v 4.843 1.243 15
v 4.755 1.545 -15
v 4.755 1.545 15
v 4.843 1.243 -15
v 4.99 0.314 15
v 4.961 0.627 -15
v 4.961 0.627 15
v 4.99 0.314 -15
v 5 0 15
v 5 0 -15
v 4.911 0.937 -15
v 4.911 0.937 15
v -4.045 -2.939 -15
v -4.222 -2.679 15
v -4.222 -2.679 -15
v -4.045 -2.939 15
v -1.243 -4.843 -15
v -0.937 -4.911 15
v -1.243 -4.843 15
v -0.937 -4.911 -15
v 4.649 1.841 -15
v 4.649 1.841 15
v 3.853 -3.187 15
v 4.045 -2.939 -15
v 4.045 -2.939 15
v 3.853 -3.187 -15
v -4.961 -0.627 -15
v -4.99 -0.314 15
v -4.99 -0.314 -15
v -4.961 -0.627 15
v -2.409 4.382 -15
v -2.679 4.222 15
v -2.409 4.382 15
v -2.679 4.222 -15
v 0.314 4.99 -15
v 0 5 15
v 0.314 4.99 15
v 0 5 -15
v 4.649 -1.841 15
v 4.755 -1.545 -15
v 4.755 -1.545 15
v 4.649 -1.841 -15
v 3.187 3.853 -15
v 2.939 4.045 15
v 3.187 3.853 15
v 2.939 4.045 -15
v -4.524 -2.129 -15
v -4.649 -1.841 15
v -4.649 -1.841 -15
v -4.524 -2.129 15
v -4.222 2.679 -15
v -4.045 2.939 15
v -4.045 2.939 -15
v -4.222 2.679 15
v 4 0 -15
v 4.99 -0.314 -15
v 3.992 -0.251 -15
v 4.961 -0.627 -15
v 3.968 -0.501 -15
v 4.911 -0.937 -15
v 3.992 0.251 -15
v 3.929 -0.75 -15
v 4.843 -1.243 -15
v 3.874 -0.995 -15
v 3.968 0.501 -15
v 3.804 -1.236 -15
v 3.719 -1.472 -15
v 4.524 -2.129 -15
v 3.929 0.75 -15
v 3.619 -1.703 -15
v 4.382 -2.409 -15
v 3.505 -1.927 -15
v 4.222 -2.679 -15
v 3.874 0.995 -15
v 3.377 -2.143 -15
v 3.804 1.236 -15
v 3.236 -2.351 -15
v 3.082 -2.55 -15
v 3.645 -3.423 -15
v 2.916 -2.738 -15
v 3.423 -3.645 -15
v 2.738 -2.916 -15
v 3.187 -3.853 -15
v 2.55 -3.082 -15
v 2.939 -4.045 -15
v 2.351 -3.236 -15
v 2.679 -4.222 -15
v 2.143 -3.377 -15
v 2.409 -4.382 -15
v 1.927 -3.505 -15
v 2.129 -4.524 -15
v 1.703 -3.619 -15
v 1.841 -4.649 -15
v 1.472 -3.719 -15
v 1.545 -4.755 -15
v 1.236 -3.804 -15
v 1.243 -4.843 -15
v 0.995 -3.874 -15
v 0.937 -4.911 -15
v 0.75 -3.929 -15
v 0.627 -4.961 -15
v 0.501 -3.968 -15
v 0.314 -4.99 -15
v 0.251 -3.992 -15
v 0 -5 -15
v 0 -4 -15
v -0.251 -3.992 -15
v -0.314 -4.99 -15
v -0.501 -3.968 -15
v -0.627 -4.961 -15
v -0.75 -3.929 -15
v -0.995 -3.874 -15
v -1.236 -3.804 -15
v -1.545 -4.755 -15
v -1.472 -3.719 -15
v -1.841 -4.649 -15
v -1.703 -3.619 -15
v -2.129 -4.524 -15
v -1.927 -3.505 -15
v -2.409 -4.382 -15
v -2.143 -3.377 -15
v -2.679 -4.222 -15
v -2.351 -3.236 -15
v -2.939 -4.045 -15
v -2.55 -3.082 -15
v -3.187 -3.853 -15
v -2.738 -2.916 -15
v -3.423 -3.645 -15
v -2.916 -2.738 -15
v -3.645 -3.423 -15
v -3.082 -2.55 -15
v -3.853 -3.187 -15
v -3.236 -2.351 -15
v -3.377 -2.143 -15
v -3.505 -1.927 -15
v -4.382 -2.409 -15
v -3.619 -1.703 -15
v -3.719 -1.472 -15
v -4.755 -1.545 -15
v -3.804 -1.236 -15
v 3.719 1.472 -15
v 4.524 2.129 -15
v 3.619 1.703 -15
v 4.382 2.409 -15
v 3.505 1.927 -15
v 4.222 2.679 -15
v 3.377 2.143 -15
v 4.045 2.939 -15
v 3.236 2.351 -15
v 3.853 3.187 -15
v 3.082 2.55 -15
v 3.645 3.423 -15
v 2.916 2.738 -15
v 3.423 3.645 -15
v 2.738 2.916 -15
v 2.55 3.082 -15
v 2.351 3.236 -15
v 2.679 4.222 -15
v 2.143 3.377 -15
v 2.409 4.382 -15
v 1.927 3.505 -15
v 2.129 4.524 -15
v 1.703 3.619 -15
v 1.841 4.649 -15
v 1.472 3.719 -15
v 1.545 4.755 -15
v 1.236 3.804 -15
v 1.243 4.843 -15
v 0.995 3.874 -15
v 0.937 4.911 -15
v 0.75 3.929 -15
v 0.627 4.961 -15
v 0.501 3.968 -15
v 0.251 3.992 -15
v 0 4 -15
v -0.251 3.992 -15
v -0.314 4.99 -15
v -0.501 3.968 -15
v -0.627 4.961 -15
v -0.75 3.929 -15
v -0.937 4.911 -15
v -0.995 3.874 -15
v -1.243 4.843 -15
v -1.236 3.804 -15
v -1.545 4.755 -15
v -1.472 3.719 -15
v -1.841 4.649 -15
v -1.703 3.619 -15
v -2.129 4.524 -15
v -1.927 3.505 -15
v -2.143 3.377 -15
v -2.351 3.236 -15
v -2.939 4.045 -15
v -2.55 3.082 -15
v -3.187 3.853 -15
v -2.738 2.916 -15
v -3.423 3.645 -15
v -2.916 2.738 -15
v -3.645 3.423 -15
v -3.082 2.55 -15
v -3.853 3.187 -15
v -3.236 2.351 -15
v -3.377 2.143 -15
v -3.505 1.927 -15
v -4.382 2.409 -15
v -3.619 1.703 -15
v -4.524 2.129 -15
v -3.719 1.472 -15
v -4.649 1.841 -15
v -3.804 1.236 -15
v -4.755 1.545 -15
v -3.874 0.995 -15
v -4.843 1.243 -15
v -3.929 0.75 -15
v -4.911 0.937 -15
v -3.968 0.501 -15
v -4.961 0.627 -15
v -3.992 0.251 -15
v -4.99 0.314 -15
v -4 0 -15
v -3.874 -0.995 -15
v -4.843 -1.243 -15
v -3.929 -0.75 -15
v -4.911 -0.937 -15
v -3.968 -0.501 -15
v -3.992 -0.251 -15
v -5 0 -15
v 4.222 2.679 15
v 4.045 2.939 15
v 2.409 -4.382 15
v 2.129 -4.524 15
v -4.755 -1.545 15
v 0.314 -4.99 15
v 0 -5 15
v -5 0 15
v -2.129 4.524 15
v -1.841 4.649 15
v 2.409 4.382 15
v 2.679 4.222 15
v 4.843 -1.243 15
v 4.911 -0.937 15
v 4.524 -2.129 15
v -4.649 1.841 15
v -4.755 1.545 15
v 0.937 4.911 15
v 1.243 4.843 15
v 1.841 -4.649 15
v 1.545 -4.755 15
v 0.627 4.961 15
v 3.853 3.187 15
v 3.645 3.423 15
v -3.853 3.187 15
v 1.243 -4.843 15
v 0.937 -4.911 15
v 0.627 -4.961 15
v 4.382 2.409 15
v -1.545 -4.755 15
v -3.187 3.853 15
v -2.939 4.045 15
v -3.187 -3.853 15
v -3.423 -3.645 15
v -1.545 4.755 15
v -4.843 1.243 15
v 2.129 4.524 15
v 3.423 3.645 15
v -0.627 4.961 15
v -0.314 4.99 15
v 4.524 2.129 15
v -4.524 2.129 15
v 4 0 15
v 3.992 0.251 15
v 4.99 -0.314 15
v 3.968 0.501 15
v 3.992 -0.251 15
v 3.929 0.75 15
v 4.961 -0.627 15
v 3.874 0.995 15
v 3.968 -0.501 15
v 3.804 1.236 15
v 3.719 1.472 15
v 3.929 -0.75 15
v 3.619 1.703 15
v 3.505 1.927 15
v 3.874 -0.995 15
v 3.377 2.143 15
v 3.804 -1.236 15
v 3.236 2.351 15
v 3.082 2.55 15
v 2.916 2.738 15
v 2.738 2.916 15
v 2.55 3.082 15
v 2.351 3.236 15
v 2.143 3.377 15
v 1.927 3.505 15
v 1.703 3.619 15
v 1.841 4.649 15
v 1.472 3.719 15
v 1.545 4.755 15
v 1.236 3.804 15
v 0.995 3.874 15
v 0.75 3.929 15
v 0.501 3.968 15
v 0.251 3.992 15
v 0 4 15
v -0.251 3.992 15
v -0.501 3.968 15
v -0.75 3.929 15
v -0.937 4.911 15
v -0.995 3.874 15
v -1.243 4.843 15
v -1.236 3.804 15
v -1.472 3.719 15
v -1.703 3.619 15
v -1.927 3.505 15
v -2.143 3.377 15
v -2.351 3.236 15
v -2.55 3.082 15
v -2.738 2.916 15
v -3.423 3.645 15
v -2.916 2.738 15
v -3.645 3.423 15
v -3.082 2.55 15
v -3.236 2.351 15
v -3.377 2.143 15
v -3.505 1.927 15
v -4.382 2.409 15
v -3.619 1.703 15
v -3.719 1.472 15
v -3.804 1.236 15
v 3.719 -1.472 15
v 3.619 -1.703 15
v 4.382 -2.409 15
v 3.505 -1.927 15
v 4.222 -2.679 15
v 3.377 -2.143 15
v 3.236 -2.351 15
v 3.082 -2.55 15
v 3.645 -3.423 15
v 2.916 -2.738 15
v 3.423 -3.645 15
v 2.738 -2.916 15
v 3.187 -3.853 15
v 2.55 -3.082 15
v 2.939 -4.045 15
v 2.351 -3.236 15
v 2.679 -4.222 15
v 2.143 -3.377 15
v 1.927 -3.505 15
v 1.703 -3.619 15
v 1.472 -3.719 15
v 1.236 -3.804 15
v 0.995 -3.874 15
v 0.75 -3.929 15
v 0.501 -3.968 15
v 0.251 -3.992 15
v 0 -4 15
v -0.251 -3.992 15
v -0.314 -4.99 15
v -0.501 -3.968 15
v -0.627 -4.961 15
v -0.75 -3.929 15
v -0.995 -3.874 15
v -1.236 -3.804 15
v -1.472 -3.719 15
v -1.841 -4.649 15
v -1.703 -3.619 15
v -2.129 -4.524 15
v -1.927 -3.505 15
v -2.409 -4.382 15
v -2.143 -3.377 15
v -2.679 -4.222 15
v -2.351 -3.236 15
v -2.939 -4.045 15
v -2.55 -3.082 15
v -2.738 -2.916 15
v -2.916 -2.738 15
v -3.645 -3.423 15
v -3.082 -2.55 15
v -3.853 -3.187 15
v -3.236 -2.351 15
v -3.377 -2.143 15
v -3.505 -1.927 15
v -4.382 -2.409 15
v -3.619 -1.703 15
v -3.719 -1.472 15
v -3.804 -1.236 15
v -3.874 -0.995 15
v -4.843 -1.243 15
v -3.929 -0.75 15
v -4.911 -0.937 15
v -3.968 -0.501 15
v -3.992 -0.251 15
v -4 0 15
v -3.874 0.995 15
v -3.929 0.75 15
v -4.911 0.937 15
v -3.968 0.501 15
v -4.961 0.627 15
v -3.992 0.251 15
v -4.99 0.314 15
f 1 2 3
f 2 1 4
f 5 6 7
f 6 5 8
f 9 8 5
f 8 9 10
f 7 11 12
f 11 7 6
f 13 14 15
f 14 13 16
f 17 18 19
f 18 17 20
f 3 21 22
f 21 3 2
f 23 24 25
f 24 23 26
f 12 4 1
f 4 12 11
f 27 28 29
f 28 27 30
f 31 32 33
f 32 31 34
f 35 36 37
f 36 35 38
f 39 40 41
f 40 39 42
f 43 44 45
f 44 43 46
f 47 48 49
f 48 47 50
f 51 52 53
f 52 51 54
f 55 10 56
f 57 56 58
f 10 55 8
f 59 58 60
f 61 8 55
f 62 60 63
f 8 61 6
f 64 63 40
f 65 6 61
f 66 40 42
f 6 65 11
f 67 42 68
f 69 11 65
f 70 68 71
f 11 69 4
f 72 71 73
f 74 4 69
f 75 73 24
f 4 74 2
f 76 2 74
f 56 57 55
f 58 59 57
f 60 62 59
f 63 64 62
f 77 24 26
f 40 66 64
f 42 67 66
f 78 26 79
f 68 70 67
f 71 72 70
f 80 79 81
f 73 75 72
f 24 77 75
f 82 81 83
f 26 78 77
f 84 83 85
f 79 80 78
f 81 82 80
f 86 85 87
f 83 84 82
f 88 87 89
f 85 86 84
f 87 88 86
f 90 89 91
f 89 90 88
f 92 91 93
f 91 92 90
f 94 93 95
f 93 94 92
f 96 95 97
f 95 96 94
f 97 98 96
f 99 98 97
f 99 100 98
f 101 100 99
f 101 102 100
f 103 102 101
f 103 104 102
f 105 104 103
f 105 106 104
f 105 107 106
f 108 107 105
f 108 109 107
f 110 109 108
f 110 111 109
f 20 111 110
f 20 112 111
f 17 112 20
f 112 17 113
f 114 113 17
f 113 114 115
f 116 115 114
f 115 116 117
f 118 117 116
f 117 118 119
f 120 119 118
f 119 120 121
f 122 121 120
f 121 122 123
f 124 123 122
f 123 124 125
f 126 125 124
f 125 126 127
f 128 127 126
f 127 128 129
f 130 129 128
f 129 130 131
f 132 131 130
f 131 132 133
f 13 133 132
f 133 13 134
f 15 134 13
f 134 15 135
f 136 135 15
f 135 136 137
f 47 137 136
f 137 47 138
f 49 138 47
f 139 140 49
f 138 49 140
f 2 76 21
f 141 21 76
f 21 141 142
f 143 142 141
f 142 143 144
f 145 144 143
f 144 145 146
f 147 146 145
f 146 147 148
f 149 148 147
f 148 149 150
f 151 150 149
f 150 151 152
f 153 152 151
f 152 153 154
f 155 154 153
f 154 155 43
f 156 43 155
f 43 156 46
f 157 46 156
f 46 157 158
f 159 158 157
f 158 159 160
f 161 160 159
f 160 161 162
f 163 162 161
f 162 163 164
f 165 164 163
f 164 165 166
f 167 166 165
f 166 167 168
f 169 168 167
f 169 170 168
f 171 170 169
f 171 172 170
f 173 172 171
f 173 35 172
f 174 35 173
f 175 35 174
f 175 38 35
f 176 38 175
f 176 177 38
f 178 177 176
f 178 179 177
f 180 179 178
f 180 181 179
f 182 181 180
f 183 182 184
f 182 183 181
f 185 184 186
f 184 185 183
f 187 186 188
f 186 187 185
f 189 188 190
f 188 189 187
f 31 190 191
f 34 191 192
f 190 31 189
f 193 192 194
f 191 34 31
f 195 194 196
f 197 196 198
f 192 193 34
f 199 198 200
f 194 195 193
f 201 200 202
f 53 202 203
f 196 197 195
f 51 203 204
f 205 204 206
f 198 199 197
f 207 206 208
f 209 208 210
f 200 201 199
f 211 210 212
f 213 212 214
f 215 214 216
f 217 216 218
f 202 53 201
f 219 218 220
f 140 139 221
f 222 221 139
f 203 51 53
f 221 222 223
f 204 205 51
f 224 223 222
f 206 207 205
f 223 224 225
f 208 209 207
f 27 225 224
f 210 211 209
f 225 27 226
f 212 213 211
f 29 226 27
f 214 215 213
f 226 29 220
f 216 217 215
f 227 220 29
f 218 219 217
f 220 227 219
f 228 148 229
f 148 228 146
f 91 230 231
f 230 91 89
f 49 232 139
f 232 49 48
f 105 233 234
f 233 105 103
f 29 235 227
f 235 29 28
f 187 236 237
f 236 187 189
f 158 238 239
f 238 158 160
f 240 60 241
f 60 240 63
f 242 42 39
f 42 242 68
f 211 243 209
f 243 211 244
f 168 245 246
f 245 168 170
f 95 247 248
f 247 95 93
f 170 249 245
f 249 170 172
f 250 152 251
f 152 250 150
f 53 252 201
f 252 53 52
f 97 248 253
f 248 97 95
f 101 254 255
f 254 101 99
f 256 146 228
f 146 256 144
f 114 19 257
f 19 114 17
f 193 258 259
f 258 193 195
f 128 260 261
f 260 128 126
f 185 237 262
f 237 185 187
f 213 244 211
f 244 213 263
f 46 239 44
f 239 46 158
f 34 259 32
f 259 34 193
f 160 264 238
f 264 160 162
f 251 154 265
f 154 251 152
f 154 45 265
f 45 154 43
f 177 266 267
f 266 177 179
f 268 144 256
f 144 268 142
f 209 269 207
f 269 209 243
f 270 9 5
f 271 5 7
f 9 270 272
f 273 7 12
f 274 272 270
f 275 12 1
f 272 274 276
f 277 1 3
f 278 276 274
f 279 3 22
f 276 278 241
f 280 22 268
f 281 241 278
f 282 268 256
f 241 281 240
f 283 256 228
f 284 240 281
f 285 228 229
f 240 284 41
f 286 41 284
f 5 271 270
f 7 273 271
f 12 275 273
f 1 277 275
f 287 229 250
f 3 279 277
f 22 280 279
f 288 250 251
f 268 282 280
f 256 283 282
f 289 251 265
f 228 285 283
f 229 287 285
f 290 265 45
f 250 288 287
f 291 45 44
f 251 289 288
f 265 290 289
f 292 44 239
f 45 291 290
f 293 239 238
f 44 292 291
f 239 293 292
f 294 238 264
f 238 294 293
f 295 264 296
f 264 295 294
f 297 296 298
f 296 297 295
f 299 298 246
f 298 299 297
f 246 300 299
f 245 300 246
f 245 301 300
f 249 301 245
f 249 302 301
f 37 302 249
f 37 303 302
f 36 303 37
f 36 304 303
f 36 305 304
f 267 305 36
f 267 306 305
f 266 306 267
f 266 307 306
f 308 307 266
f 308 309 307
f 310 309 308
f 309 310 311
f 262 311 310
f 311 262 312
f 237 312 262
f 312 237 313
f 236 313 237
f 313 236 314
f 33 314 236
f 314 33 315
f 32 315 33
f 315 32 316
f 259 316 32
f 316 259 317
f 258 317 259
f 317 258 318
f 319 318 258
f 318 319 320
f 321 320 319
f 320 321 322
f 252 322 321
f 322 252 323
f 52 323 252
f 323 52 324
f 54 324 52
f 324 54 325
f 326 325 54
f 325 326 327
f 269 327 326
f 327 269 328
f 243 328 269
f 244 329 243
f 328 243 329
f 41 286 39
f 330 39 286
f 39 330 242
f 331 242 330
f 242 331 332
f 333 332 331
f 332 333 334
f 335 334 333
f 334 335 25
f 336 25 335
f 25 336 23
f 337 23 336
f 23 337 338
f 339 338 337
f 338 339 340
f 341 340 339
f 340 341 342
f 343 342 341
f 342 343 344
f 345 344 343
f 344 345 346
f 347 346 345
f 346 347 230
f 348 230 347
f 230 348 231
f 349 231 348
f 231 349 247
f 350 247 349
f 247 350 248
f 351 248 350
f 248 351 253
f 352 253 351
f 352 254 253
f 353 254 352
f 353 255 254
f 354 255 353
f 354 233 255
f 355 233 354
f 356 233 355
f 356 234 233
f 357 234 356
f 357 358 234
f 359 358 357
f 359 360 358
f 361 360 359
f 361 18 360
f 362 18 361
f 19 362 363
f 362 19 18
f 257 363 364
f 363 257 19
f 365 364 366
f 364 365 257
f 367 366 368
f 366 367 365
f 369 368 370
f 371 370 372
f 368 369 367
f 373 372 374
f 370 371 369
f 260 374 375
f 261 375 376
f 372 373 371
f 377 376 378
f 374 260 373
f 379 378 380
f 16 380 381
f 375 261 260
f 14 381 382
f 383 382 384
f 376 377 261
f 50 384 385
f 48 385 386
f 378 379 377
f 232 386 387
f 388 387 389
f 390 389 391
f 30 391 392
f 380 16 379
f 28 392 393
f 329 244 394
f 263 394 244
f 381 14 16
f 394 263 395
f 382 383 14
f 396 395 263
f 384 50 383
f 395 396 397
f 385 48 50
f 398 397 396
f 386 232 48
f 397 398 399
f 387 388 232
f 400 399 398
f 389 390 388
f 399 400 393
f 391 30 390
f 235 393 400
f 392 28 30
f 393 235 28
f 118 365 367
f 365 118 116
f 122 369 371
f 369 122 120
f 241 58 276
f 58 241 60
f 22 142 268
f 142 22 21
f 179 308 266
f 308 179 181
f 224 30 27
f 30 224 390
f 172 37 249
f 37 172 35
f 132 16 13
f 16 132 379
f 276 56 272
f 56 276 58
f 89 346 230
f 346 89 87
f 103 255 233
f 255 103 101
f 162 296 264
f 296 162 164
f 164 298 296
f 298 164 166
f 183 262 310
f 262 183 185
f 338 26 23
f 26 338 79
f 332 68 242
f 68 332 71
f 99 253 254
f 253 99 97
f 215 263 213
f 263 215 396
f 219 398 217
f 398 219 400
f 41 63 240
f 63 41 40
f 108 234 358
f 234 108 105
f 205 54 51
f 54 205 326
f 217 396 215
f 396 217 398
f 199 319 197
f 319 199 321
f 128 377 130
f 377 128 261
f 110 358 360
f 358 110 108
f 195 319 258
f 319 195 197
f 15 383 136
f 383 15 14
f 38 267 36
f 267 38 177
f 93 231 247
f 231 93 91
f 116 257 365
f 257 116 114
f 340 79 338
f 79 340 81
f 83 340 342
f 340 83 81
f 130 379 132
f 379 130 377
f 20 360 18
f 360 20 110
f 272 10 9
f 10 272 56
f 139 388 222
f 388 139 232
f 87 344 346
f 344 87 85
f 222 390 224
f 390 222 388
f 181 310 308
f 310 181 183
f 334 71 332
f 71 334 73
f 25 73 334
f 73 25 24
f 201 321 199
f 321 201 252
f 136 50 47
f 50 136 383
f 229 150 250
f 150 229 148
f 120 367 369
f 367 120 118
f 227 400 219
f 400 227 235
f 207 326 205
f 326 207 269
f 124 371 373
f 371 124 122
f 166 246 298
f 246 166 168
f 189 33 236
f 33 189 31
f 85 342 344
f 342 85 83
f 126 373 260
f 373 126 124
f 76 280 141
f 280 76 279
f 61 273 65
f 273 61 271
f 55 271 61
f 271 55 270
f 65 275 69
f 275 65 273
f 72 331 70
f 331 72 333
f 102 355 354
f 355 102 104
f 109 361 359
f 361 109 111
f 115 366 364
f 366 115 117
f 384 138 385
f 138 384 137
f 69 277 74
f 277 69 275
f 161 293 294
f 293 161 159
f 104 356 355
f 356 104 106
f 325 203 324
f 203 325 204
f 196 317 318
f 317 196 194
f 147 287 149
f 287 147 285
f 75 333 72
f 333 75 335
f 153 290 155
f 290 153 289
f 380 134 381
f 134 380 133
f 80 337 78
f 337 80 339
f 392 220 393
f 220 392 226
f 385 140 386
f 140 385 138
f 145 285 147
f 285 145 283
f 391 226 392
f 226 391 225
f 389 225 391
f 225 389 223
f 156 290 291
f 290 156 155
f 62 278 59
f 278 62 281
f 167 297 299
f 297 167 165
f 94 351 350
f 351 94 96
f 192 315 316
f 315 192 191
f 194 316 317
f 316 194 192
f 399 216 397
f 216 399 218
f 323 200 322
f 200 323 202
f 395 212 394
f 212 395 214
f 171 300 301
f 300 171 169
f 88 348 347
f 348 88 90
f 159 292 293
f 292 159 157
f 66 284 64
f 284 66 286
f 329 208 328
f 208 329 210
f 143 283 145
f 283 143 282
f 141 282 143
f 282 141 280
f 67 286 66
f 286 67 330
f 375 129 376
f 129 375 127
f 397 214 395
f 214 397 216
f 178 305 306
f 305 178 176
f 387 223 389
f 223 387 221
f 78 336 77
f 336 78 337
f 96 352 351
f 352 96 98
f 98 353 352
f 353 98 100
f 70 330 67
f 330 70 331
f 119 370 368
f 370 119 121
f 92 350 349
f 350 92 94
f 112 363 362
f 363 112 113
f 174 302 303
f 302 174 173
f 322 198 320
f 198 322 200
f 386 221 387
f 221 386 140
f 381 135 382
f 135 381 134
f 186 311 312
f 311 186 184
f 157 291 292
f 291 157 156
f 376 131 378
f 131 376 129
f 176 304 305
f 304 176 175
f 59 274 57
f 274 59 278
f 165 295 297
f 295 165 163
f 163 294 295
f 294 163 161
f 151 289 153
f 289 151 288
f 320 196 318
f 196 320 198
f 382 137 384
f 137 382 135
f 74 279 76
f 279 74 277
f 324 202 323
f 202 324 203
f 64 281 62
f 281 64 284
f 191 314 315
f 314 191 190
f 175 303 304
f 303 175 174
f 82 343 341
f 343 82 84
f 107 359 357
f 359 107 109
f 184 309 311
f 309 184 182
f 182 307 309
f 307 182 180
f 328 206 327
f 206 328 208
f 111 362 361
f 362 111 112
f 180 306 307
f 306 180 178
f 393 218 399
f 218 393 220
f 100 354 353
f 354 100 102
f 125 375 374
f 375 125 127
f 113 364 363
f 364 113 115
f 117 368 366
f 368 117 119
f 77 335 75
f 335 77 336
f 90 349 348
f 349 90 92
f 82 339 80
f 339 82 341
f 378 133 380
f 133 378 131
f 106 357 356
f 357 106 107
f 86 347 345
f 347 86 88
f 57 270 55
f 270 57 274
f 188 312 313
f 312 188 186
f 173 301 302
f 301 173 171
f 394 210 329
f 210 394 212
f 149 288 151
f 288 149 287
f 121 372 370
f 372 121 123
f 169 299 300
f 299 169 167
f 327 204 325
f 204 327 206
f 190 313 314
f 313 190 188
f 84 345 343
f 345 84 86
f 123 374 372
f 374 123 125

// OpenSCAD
// washer.scad
// library for parametric washer, bushing, spacer, ring or gasket
// Author: Tony Z. Tonchev, Michigan (USA) 
// last update: October 2018


// (in mm)
Outside_Diameter = 10;

// (in mm)
Inside_Diameter = 8;

// (in mm)
Thickness = 30;

/* [Hidden] */

$fn=100;
TZT_WASHER (Thickness, Outside_Diameter/2, Inside_Diameter/2);

module TZT_WASHER (TZT_Thk, TZT_RadA, TZT_RadB) {
    difference () {
        cylinder (TZT_Thk, TZT_RadA, TZT_RadA, true);
        cylinder (TZT_Thk+1, TZT_RadB, TZT_RadB, true);
    }
} 
